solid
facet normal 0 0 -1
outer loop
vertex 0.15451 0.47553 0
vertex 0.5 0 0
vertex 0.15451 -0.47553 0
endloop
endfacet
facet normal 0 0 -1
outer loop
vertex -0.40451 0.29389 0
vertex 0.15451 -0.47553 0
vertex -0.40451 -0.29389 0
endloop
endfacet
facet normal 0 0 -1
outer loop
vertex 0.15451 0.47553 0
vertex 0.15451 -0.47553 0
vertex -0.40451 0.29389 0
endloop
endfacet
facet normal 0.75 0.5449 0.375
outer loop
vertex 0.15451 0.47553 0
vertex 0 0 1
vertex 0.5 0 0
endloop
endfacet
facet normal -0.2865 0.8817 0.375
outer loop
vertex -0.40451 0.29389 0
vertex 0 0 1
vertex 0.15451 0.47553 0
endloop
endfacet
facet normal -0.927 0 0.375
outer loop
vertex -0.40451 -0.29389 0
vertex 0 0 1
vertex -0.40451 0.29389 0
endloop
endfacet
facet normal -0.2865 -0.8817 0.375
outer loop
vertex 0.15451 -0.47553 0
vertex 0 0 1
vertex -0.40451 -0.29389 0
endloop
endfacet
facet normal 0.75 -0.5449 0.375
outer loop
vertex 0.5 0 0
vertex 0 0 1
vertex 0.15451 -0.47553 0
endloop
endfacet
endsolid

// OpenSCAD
// Pentagon Pyramid for Stacks of Shapes
// by Slashee the Cow

linear_extrude(1, scale = 0)
circle(d=1, $fn=5);
